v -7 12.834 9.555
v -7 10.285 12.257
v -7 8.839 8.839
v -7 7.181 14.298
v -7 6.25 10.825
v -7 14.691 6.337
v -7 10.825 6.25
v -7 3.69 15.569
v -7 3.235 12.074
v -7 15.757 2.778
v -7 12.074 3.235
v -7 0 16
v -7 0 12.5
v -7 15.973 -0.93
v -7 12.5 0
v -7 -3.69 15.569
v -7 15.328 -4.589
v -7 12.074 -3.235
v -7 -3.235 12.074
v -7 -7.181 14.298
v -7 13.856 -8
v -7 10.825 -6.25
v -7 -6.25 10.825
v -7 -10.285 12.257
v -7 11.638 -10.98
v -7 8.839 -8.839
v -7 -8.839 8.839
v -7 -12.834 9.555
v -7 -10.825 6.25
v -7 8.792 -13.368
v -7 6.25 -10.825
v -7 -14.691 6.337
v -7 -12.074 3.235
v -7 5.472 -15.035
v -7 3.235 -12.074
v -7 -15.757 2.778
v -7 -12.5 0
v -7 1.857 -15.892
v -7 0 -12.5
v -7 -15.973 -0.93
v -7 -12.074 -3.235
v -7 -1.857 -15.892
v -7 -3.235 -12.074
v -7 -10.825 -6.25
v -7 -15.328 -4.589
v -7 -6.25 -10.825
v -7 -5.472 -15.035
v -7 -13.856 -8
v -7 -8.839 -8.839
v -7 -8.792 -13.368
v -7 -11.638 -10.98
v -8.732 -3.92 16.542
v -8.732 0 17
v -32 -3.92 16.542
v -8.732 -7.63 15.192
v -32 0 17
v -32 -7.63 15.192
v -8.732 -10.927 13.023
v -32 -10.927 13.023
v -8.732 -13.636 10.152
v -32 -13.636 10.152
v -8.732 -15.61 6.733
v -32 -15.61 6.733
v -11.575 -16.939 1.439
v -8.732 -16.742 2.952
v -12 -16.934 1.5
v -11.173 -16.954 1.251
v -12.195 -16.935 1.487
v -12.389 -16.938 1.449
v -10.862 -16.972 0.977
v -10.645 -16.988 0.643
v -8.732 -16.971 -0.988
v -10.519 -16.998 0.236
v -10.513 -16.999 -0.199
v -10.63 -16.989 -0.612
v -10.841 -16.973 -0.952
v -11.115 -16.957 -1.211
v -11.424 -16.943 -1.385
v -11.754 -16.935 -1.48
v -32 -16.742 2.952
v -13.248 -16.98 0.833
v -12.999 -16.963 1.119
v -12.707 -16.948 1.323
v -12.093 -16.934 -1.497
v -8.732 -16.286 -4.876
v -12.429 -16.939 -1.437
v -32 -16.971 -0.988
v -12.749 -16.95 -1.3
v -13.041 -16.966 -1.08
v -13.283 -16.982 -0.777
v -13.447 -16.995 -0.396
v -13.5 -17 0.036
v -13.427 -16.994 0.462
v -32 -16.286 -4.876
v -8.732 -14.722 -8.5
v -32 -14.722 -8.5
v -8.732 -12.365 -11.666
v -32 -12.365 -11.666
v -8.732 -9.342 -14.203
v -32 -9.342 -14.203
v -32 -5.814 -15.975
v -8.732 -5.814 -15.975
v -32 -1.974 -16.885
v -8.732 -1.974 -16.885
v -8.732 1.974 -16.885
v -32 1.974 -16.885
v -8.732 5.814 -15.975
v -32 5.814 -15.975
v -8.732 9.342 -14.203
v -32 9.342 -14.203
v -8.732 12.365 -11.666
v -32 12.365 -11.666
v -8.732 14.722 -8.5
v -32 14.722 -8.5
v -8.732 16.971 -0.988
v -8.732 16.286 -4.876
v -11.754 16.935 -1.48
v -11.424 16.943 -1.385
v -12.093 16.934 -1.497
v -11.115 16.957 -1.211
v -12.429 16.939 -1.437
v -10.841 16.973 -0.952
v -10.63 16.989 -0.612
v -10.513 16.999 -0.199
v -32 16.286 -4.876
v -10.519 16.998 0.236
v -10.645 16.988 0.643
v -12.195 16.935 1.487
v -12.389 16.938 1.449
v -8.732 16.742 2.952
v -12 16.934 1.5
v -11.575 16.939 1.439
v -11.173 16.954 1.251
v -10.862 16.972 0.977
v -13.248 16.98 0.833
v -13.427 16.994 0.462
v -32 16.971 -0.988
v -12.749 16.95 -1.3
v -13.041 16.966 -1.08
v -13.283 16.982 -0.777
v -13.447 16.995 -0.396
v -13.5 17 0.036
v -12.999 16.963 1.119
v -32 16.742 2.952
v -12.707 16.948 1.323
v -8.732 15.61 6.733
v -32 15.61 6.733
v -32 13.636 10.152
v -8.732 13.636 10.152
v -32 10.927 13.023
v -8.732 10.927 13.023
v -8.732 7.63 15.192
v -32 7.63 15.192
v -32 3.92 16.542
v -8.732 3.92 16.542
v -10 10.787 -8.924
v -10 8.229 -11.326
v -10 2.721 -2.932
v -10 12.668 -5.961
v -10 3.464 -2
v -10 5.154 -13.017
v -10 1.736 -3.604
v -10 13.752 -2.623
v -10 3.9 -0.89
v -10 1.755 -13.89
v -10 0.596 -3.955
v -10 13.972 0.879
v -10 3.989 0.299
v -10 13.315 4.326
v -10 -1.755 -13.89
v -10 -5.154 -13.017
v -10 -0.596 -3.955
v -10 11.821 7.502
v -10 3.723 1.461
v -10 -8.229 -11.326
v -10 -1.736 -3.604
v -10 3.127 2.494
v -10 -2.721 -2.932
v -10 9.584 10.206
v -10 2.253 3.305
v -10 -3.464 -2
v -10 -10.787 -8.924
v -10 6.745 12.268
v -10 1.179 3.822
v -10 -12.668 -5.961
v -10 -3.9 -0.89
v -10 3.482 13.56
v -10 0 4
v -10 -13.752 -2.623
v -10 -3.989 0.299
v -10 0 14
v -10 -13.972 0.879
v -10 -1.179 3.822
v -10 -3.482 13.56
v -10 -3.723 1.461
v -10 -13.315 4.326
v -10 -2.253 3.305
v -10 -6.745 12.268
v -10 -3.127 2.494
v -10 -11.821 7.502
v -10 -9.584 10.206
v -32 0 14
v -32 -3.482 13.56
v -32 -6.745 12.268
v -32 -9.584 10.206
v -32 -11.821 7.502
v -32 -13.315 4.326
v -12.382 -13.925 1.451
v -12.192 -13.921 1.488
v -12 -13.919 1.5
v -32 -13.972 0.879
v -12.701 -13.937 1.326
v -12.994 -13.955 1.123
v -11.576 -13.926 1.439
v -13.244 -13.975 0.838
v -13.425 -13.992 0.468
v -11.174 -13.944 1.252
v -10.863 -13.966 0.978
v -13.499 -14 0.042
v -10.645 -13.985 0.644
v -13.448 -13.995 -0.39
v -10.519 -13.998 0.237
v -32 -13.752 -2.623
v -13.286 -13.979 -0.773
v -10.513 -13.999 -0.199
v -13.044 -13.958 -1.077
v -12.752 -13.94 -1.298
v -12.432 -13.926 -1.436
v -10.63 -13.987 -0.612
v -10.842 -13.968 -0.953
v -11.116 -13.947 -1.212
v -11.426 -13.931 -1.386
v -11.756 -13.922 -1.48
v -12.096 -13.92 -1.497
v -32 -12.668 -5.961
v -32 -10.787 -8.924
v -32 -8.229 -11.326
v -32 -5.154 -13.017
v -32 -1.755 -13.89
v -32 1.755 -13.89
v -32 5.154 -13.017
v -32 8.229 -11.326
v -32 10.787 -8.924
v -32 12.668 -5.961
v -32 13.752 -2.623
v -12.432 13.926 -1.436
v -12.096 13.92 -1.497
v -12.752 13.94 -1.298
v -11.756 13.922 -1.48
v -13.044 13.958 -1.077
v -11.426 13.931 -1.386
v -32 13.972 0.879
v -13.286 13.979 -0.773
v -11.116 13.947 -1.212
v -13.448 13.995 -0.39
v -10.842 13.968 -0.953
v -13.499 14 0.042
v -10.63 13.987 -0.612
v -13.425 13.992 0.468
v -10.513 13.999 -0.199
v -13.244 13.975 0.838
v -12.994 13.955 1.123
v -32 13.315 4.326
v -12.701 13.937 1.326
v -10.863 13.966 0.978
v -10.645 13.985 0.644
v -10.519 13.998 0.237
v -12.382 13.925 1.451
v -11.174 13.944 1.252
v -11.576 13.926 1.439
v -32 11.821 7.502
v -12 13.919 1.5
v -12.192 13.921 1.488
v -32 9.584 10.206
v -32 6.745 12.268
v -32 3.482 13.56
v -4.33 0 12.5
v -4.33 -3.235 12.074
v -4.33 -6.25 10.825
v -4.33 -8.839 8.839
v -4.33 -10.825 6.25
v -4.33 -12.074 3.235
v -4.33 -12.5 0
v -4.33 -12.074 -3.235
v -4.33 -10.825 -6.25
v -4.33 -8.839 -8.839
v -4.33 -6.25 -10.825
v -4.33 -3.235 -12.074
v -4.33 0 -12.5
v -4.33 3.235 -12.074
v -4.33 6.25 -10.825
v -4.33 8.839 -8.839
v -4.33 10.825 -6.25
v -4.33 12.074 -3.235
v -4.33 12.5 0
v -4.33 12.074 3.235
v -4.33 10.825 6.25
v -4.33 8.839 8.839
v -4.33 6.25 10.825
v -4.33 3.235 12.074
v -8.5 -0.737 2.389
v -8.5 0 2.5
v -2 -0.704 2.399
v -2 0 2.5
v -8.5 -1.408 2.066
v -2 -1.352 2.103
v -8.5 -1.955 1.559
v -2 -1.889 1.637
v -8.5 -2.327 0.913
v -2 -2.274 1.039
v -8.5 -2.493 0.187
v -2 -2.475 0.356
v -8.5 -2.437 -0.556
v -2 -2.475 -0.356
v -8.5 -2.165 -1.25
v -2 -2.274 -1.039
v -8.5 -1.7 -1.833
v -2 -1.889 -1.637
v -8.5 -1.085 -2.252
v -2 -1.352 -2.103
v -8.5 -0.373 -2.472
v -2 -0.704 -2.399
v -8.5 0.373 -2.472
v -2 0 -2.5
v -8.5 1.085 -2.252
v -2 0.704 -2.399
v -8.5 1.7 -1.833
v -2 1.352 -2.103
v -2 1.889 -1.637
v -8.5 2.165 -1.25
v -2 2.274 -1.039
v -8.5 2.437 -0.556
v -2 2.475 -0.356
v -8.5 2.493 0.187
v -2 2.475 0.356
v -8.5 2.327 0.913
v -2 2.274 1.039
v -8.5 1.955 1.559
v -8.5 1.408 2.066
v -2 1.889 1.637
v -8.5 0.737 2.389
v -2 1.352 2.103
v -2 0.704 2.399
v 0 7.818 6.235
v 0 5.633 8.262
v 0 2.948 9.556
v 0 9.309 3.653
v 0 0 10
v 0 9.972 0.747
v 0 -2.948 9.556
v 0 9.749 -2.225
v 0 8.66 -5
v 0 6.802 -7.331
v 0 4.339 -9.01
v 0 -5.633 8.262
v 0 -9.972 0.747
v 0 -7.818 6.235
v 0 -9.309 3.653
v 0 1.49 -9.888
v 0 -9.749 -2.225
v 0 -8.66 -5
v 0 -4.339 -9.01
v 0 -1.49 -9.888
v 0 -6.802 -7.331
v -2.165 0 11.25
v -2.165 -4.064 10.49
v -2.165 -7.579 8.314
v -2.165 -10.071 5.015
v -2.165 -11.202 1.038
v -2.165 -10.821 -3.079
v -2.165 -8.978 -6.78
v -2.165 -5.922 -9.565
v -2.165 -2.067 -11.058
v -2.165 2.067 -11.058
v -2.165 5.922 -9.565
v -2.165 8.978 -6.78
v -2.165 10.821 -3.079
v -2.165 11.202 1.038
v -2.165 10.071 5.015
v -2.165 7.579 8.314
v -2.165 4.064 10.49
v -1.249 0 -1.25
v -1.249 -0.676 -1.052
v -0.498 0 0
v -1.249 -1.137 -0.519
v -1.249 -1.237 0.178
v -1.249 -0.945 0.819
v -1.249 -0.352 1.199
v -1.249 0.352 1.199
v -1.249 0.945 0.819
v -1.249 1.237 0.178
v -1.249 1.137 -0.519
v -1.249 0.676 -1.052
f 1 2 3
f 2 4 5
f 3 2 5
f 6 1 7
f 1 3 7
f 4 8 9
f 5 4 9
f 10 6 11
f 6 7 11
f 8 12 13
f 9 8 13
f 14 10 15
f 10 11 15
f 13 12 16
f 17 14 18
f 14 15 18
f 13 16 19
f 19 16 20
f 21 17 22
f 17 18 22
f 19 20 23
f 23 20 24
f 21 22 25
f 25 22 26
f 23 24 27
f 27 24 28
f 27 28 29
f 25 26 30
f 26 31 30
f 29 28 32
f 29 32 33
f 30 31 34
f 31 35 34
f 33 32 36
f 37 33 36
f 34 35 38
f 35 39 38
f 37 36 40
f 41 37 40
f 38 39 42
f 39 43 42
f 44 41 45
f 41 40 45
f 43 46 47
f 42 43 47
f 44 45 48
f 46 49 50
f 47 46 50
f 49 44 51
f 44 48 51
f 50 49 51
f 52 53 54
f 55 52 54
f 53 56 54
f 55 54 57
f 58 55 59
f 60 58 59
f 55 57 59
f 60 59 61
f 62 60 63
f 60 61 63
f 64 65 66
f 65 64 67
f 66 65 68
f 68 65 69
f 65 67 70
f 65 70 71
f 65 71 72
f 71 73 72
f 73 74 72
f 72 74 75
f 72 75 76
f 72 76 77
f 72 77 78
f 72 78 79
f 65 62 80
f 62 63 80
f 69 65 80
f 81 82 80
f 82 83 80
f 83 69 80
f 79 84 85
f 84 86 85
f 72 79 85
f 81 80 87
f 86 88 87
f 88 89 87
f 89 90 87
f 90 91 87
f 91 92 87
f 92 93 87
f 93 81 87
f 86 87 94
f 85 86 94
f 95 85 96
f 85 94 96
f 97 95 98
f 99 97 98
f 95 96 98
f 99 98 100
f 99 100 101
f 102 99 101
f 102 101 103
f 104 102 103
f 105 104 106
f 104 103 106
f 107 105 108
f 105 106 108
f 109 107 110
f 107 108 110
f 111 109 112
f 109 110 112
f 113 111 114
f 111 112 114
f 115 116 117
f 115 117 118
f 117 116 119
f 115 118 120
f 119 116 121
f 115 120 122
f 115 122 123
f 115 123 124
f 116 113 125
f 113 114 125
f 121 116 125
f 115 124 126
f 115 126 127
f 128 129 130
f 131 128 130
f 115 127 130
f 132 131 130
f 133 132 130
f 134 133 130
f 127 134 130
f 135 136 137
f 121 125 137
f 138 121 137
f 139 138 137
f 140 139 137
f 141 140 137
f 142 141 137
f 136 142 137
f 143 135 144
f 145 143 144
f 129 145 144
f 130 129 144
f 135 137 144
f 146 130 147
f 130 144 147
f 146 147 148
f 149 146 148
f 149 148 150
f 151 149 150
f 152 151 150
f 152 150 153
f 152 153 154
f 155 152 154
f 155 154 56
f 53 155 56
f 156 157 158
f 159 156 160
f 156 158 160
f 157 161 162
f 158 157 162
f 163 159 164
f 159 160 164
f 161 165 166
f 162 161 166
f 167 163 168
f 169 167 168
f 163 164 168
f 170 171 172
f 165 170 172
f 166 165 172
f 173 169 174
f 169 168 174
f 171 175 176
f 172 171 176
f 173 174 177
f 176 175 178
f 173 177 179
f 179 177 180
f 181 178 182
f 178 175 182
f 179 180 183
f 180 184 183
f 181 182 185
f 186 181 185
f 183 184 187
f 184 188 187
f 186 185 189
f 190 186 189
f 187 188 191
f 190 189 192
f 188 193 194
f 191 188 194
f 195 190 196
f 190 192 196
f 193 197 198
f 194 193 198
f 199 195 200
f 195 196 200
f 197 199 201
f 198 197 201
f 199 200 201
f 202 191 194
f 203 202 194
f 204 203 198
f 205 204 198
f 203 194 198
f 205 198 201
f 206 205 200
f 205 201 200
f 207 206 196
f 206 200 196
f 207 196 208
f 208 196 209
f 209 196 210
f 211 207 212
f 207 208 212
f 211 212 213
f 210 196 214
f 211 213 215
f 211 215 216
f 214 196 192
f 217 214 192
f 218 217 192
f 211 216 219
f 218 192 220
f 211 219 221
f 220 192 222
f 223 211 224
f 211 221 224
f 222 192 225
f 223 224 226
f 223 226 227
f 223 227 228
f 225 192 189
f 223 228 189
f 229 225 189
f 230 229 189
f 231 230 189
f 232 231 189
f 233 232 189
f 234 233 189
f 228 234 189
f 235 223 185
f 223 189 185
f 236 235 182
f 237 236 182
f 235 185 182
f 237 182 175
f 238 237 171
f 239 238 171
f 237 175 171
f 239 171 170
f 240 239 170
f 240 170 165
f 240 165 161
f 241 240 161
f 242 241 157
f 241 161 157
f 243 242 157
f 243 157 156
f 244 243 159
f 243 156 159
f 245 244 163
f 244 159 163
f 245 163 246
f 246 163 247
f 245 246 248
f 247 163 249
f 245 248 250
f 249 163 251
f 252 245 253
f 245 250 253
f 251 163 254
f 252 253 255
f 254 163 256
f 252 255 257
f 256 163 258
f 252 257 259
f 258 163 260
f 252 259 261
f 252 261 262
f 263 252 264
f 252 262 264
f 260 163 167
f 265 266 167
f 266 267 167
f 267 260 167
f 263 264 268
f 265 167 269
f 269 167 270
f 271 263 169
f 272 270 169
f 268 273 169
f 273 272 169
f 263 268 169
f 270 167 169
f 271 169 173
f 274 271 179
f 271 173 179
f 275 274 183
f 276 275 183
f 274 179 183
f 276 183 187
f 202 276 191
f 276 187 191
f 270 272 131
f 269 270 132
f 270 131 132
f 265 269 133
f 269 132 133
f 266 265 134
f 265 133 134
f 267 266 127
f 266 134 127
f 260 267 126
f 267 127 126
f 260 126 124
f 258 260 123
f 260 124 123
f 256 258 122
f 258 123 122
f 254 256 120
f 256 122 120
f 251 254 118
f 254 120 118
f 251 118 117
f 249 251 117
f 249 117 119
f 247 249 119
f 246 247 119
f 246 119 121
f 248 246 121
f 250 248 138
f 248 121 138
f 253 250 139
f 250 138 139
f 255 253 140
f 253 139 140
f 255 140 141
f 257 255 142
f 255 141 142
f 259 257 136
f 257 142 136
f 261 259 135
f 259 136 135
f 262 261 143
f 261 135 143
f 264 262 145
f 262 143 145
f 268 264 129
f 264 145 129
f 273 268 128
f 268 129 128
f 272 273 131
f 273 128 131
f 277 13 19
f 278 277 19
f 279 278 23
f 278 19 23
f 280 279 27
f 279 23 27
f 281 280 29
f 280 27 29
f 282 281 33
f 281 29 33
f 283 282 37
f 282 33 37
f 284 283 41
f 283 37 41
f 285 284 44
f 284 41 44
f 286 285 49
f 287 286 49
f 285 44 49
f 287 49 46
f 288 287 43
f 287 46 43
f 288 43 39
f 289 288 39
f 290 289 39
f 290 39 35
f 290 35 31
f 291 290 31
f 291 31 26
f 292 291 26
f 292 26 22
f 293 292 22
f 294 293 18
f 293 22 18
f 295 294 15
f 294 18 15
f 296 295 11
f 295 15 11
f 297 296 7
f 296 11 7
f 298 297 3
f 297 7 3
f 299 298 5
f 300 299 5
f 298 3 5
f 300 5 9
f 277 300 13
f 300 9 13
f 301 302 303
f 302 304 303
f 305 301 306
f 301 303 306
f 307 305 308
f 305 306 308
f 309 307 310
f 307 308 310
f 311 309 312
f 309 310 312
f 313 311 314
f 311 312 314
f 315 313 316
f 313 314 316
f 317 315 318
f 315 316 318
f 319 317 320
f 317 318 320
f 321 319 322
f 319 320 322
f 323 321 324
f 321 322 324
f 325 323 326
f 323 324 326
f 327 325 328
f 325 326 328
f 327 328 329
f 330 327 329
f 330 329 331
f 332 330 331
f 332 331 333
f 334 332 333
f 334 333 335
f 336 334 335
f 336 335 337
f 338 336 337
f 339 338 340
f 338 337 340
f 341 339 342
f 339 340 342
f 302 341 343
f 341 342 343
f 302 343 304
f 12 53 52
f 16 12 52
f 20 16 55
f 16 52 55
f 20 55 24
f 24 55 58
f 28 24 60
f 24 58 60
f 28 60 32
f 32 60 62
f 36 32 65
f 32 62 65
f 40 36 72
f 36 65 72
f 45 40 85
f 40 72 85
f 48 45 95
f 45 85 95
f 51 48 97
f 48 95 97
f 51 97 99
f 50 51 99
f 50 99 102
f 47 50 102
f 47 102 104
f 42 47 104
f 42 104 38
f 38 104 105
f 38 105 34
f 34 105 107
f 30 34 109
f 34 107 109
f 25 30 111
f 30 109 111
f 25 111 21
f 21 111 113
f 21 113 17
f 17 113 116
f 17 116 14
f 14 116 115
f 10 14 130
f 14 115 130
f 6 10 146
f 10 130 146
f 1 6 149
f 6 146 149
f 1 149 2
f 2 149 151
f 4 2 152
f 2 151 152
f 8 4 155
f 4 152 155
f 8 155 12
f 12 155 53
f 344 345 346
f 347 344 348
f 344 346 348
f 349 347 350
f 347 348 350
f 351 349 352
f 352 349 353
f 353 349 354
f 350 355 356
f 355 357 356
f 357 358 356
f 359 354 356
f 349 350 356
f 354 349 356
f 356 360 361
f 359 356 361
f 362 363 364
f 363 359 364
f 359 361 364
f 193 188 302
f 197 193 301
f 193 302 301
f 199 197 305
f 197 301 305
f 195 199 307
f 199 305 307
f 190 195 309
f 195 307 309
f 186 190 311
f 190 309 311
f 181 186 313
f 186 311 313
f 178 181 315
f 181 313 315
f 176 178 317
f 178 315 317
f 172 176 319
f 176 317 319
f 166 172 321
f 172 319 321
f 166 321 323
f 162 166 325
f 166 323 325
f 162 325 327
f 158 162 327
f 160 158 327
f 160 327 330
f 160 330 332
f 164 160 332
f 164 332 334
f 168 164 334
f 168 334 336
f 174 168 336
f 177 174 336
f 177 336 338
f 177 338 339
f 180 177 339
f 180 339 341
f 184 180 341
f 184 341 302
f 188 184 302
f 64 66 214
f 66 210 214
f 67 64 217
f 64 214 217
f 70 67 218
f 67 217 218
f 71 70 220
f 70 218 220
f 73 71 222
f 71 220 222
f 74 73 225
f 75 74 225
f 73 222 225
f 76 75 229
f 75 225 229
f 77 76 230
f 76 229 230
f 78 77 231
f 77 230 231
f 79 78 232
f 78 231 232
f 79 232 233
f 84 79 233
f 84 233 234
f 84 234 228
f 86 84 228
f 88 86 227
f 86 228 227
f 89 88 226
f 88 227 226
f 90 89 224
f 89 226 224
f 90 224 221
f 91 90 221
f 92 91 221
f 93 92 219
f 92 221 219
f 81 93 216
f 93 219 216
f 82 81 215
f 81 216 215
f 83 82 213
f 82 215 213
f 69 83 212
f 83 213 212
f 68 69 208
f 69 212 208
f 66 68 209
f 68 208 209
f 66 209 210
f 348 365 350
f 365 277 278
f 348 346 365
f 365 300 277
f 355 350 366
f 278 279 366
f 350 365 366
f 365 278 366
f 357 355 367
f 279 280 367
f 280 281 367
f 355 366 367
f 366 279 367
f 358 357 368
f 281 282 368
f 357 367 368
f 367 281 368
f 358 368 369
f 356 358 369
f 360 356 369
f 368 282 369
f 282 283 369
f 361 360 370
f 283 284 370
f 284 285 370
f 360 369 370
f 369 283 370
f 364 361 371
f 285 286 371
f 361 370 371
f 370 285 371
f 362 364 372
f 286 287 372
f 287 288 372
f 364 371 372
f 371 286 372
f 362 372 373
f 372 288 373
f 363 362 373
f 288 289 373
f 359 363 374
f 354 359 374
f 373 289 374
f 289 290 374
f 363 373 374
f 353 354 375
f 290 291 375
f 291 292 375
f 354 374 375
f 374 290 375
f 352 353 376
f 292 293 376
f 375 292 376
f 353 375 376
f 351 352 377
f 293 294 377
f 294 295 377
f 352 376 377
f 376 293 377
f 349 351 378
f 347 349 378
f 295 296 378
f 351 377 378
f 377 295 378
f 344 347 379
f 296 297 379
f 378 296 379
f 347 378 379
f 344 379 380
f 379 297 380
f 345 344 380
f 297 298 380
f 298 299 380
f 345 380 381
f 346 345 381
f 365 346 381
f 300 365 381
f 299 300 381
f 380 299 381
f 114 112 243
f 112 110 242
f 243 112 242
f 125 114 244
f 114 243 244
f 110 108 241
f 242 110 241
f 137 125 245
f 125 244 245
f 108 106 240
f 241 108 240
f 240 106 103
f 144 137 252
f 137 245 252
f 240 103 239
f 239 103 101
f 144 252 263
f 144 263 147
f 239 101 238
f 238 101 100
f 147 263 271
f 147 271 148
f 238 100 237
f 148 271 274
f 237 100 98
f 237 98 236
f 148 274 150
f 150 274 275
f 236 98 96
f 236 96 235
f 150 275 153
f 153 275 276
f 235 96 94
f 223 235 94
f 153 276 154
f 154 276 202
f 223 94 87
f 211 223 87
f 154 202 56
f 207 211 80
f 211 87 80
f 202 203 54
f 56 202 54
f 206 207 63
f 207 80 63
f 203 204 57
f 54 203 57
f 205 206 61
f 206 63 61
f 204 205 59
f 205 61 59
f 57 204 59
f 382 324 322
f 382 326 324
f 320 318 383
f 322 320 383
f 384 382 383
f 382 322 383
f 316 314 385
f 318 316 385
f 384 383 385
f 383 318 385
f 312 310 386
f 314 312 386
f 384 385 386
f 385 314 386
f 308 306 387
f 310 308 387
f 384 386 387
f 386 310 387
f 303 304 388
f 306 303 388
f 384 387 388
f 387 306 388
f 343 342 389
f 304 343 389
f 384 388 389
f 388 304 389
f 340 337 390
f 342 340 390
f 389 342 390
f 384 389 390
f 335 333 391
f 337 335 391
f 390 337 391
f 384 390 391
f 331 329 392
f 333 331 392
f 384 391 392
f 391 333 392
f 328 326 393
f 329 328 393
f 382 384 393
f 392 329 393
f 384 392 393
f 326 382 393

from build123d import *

# Parameters (mm, degrees)
CHAMFER_1_SIZE               = 2.5
CHAMFER_1_SIZE2              = 4.330127019
CHAMFER_2_SIZE               = 1
CHAMFER_2_SIZE2              = 1.732050808
HOLE_WIZARD_M6_1_D           = 5
HOLE_WIZARD_M6_1_DEPTH       = 8
HOLE_WIZARD_M6_1_CSINK_D     = 8
HOLE_WIZARD_M6_1_CSINK_ANGLE = 90
HOLE_WIZARD_M6_1_TIP         = 1.502151548
SKETCH_4_R                   = 1.5
CUT_EXTRUDE_1_DEPTH          = 20


with BuildPart() as part:
    # 草图1 (on Front Plane) → 旋转1 (revolve)
    with BuildSketch(Plane.XY, mode=Mode.PRIVATE) as revolve_1_sk:
        Polygon((0, 0), (0, 12.5), (-7, 12.5), (-7, 17), (-32, 17), (-32, 14), (-10, 14), (-10, 0), align=None)
    revolve(revolve_1_sk.sketch.rotate(Axis((-10, 0, 0), (1, 0, 0)), 90), axis=Axis((-10, 0, 0), (1, 0, 0)))

    # 倒角1
    chamfer_1_edges = [part.edges().sort_by_distance(p)[0] for p in [
        (0, 0, -12.5),
    ]]
    chamfer_1_side = [part.faces().sort_by_distance(p)[0] for p in [
        (0, 0, 0),
    ]]
    chamfer(chamfer_1_edges, length=CHAMFER_1_SIZE, length2=CHAMFER_1_SIZE2, reference=chamfer_1_side[0])

    # 倒角2
    chamfer_2_edges = [part.edges().sort_by_distance(p)[0] for p in [
        (-7, 0, -17),
    ]]
    chamfer_2_side = [part.faces().sort_by_distance(p)[0] for p in [
        (-7, 0, -12.980832611),
    ]]
    chamfer(chamfer_2_edges, length=CHAMFER_2_SIZE, length2=CHAMFER_2_SIZE2, reference=chamfer_2_side[0])

    # M6 螺纹孔1
    with Locations(Plane(origin=(-10, 0, 0), x_dir=(0, 0, -1), z_dir=(-1, 0, 0))):
        with Locations((0, 0)):
            CounterSinkHole(HOLE_WIZARD_M6_1_D / 2, HOLE_WIZARD_M6_1_CSINK_D / 2, depth=HOLE_WIZARD_M6_1_DEPTH, counter_sink_angle=HOLE_WIZARD_M6_1_CSINK_ANGLE)
            with Locations((0, 0, -(HOLE_WIZARD_M6_1_DEPTH + HOLE_WIZARD_M6_1_TIP / 2))):  # 118° drill point
                Cone(0, HOLE_WIZARD_M6_1_D / 2, HOLE_WIZARD_M6_1_TIP, mode=Mode.SUBTRACT)

    # 草图4 → 切除-拉伸1 (cut, symmetric)
    with BuildSketch(Plane(origin=(0, 0, 0), x_dir=(1, 0, 0), z_dir=(0, 1, 0))):
        with Locations(Location((-12, 0, 0), (0, 0, 270))):
            Circle(SKETCH_4_R)
    extrude(amount=CUT_EXTRUDE_1_DEPTH, both=True, mode=Mode.SUBTRACT)


solid = part.part
